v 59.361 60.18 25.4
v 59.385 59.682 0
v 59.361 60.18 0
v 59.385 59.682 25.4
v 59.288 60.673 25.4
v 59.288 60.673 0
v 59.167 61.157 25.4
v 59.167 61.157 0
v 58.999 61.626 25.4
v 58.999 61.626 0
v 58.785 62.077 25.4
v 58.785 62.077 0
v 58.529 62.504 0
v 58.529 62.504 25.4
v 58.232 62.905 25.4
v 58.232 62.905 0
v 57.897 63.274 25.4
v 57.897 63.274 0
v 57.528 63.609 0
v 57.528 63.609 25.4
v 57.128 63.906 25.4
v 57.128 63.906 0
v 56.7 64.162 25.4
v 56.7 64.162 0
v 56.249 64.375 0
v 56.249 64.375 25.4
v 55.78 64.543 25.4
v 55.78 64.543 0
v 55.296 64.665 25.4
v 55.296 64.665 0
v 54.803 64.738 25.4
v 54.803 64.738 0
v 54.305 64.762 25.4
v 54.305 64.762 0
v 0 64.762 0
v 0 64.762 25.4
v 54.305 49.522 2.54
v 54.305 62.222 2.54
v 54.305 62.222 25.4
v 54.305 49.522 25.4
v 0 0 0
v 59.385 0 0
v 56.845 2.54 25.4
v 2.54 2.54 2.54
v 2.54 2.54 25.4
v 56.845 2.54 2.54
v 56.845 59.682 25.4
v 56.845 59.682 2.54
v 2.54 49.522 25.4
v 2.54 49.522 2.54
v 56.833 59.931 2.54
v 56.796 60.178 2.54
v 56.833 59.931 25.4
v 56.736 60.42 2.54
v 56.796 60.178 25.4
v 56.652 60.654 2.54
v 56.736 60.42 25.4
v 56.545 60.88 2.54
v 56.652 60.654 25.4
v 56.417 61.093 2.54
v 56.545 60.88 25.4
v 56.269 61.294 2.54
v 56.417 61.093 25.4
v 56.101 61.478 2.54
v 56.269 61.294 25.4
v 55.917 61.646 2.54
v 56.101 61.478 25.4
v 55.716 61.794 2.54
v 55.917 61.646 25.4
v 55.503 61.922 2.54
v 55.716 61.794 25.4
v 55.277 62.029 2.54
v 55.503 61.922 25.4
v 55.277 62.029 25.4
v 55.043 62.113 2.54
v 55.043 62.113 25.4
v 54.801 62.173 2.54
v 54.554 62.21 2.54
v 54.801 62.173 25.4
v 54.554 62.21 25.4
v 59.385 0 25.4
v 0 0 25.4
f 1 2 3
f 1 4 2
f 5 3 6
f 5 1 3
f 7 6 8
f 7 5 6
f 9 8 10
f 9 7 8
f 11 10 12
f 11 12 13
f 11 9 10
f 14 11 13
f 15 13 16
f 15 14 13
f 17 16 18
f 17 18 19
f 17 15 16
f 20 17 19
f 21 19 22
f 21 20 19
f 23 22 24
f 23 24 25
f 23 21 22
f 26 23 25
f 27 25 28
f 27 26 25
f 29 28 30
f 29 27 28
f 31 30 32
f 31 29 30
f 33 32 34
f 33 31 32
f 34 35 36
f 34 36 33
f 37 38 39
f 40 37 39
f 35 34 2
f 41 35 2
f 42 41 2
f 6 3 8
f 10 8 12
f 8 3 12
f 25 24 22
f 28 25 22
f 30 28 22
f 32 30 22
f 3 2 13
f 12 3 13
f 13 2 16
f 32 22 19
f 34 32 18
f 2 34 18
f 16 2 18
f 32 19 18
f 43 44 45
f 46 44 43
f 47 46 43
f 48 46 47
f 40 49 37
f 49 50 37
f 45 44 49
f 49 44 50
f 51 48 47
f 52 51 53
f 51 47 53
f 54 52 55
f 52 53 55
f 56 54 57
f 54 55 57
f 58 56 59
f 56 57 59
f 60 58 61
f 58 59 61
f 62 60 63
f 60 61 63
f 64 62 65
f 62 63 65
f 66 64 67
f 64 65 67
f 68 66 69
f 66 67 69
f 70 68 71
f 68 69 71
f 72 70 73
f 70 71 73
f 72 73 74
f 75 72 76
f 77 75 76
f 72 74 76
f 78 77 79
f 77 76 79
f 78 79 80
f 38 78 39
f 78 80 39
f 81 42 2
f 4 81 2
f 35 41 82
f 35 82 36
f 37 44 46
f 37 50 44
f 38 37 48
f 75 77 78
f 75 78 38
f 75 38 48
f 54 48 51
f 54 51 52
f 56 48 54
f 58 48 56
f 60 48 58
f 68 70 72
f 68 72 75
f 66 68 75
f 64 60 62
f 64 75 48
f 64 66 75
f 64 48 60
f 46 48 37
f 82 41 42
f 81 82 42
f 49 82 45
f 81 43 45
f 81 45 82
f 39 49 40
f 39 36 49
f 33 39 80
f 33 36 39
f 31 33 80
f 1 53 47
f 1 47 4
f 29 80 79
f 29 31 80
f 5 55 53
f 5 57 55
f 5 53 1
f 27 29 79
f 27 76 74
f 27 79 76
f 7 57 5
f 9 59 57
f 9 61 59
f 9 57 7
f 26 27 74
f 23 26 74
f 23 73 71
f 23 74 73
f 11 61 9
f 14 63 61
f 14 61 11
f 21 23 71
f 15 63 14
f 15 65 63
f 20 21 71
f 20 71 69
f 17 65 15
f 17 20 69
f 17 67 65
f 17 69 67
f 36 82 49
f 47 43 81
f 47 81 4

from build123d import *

# Parameters (mm, degrees)
F0_W     = 59.3852698803
F0_H     = 64.7621825337
F1_DEPTH = 25.4
F2_R     = 5.08
F4_DEPTH = 25.4
F5_T     = -2.54
F6_DEPTH = 12.7


with BuildPart() as f1:
    # F0 (on Top) → F1 (new body)
    with BuildSketch(Plane.XY):
        with Locations((29.6926349401, 32.3810912669)):
            Rectangle(F0_W, F0_H)
    extrude(amount=F1_DEPTH)

    # F2
    f2_edges = [f1.edges().sort_by_distance(p)[0] for p in [
        (59.38527, 64.762183, 12.7),
    ]]
    fillet(f2_edges, radius=F2_R)

    # F3 (on face) → F4 (join)
    with BuildSketch(Plane.XY.offset(25.4)):
        Polygon((26.8538445234, 51.118131727), (28.7176296115, 36.2143442035), (49.2836721241, 36.2143442035), (48.5529899597, 51.118131727), align=None)
    extrude(amount=-F4_DEPTH)

    # F5
    f5_openings = [f1.faces().sort_by_distance(p)[0] for p in [
        (29.651452, 32.336032, 25.4),
    ]]
    offset(amount=F5_T, openings=f5_openings)

    # F6 (add): a face of the model
    f6_faces = [f1.faces().sort_by_distance(p)[0] for p in [
        (28.4226349401, 62.2221825337, 13.97),
    ]]
    extrude(f6_faces, amount=F6_DEPTH)


solid = f1.part
